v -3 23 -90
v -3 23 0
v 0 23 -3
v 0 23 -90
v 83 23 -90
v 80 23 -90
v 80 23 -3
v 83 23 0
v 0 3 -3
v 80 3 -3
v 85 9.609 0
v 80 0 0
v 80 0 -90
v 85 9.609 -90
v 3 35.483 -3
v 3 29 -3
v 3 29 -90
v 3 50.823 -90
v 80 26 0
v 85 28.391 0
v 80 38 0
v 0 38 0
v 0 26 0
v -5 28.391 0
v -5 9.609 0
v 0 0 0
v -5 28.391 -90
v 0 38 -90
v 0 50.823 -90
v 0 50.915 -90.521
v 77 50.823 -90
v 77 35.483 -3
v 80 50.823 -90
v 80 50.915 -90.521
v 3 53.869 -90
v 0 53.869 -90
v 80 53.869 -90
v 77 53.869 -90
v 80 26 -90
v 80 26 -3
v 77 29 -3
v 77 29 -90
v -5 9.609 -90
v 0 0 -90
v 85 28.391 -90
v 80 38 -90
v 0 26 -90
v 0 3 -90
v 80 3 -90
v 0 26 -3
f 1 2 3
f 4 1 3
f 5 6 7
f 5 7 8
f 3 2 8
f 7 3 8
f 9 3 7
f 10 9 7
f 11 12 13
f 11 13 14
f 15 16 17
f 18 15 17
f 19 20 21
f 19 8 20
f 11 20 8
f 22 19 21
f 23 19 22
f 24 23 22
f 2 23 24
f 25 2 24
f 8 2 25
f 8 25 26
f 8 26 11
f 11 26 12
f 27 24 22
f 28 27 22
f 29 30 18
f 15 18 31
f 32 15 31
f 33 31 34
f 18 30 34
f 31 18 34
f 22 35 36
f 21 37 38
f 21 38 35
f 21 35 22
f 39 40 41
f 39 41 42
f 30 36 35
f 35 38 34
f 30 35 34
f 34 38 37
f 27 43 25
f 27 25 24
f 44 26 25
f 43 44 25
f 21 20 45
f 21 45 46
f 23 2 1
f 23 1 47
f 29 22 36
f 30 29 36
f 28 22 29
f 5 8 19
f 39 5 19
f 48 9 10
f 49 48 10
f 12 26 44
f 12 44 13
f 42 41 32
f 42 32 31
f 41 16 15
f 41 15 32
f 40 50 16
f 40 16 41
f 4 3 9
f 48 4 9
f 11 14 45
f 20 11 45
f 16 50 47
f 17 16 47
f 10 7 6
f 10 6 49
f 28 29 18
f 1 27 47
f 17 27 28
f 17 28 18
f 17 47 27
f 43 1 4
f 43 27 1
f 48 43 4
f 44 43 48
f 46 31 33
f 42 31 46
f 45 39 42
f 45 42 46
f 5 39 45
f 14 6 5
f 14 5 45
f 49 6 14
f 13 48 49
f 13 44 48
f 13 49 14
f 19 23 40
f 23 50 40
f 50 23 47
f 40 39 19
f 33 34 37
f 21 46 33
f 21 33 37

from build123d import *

# Parameters (mm, degrees)
SKETCH1_W                      = 80
SKETCH1_H                      = 90
BOSS_EXTRUDE1_BASE_DEPTH       = 3
BOSS_EXTRUDE4_SIDE_WALLS_DEPTH = 90
CUT_EXTRUDE2_GUIDE_HOLES_DEPTH = 130.495173655
SKETCH15_W                     = 80
SKETCH15_H                     = 20
BOSS_EXTRUDE9_REAR_WALL_DEPTH  = 3
BOSS_EXTRUDE1_START            = 3
SKETCH17_W                     = 80
SKETCH17_H                     = 3
BOSS_EXTRUDE1_DEPTH            = 12
BOSS_EXTRUDE2_START            = 23
SKETCH20_W                     = 3
SKETCH20_H                     = 87
BOSS_EXTRUDE2_DEPTH            = 12
CHAMFER1_SIZE                  = 3
BOSS_EXTRUDE5_DEPTH            = 30
CHAMFER2_SIZE                  = 170.138454589
CHAMFER2_SIZE_2                = 30
SKETCH27_W                     = 80
SKETCH27_H                     = 91.38839507
BOSS_EXTRUDE6_DEPTH            = 3


# Some blends are built 0.0001 mm under size
with BuildPart() as part:
    # Sketch1 → Boss-Extrude1 _Base (new body)
    with BuildSketch(Plane(origin=(0, 0, 0), x_dir=(1, 0, 0), z_dir=(0, 1, 0))):
        with Locations((40, 45)):
            Rectangle(SKETCH1_W, SKETCH1_H)
    extrude(amount=BOSS_EXTRUDE1_BASE_DEPTH)

    # Sketch5 → Boss-Extrude4 _Side Walls (add, through all)
    with BuildSketch(Plane.XY):
        Polygon((-5, 28.390936655), (0, 38), (0, 0), (-5, 9.609063345), align=None)
        Polygon((85, 9.609063345), (85, 28.390936655), (80, 38), (80, 0), align=None)
    extrude(amount=-BOSS_EXTRUDE4_SIDE_WALLS_DEPTH)

    # Sketch4 → Cut-Extrude2 _Guide Holes (cut, through all)
    with BuildSketch(Plane.XY):
        Polygon((-3, 23), (0, 26), (0, 23), align=None)
        Polygon((80, 23), (83, 23), (80, 26), align=None)
    extrude(amount=-CUT_EXTRUDE2_GUIDE_HOLES_DEPTH, mode=Mode.SUBTRACT)

    # Sketch15 → Boss-Extrude9 _Rear Wall (add)
    with BuildSketch(Plane.XY):
        with Locations((40, 13)):
            Rectangle(SKETCH15_W, SKETCH15_H)
    extrude(amount=-BOSS_EXTRUDE9_REAR_WALL_DEPTH)

    # Sketch17 → Boss-Extrude1 (add)
    with BuildSketch(Plane(origin=(0, 23, 0), x_dir=(1, 0, 0), z_dir=(0, 1, 0)).offset(BOSS_EXTRUDE1_START)):
        with Locations((40, 1.5)):
            Rectangle(SKETCH17_W, SKETCH17_H)
    extrude(amount=BOSS_EXTRUDE1_DEPTH)

    # Sketch20 → Boss-Extrude2 (add)
    with BuildSketch(Plane(origin=(0, 3, 0), x_dir=(1, 0, 0), z_dir=(0, 1, 0)).offset(BOSS_EXTRUDE2_START)):
        with Locations((1.5, 46.5)):
            Rectangle(SKETCH20_W, SKETCH20_H)
        with Locations((78.5, 46.5)):
            Rectangle(SKETCH20_W, SKETCH20_H)
    extrude(amount=BOSS_EXTRUDE2_DEPTH)

    # Chamfer1
    chamfer1_edges = [part.edges().sort_by_distance(p)[0] for p in [
        (77, 26, -46.5),
        (3, 26, -46.5),
    ]]
    chamfer(chamfer1_edges, length=CHAMFER1_SIZE - 0.0001)  # a hair under: the kernel refuses the full size

    # Sketch26 → Boss-Extrude5 (add)
    with BuildSketch(Plane(origin=(0, 38, 0), x_dir=(1, 0, 0), z_dir=(0, 1, 0))):
        Polygon((77, 90), (80, 90), (80, 0), (0, 0), (0, 90), (3, 90), (3, 3), (77, 3), align=None)
    extrude(amount=BOSS_EXTRUDE5_DEPTH)

    # Chamfer2
    # the kernel refuses this chamfer: 170.138454589, 30 mm, written as the material it takes off along each edge
    with BuildSketch(Plane(origin=(522.111375011, 68, 0), x_dir=(0, 0.0066825316561015475, -0.9999776716360548), z_dir=(-1, 0, 0))) as chamfer2_piece_1:
        Polygon((CHAMFER2_SIZE * 0.999977671633, CHAMFER2_SIZE * 0.00668253165608), (-CHAMFER2_SIZE_2 * 0.0066825316561, CHAMFER2_SIZE_2 * 0.999977671636), (0, 0), align=None)
    extrude(amount=964.222750023, mode=Mode.SUBTRACT)

    # Sketch27 → Boss-Extrude6 (add)
    with BuildSketch(Plane(origin=(0, 36.854159795, 6.498382723), x_dir=(1, 0, 0), z_dir=(0, 0.9848077530122086, 0.17364817766692742))):
        with Locations((40, 52.292828286)):
            Rectangle(SKETCH27_W, SKETCH27_H)
    extrude(amount=-BOSS_EXTRUDE6_DEPTH)


solid = part.part
